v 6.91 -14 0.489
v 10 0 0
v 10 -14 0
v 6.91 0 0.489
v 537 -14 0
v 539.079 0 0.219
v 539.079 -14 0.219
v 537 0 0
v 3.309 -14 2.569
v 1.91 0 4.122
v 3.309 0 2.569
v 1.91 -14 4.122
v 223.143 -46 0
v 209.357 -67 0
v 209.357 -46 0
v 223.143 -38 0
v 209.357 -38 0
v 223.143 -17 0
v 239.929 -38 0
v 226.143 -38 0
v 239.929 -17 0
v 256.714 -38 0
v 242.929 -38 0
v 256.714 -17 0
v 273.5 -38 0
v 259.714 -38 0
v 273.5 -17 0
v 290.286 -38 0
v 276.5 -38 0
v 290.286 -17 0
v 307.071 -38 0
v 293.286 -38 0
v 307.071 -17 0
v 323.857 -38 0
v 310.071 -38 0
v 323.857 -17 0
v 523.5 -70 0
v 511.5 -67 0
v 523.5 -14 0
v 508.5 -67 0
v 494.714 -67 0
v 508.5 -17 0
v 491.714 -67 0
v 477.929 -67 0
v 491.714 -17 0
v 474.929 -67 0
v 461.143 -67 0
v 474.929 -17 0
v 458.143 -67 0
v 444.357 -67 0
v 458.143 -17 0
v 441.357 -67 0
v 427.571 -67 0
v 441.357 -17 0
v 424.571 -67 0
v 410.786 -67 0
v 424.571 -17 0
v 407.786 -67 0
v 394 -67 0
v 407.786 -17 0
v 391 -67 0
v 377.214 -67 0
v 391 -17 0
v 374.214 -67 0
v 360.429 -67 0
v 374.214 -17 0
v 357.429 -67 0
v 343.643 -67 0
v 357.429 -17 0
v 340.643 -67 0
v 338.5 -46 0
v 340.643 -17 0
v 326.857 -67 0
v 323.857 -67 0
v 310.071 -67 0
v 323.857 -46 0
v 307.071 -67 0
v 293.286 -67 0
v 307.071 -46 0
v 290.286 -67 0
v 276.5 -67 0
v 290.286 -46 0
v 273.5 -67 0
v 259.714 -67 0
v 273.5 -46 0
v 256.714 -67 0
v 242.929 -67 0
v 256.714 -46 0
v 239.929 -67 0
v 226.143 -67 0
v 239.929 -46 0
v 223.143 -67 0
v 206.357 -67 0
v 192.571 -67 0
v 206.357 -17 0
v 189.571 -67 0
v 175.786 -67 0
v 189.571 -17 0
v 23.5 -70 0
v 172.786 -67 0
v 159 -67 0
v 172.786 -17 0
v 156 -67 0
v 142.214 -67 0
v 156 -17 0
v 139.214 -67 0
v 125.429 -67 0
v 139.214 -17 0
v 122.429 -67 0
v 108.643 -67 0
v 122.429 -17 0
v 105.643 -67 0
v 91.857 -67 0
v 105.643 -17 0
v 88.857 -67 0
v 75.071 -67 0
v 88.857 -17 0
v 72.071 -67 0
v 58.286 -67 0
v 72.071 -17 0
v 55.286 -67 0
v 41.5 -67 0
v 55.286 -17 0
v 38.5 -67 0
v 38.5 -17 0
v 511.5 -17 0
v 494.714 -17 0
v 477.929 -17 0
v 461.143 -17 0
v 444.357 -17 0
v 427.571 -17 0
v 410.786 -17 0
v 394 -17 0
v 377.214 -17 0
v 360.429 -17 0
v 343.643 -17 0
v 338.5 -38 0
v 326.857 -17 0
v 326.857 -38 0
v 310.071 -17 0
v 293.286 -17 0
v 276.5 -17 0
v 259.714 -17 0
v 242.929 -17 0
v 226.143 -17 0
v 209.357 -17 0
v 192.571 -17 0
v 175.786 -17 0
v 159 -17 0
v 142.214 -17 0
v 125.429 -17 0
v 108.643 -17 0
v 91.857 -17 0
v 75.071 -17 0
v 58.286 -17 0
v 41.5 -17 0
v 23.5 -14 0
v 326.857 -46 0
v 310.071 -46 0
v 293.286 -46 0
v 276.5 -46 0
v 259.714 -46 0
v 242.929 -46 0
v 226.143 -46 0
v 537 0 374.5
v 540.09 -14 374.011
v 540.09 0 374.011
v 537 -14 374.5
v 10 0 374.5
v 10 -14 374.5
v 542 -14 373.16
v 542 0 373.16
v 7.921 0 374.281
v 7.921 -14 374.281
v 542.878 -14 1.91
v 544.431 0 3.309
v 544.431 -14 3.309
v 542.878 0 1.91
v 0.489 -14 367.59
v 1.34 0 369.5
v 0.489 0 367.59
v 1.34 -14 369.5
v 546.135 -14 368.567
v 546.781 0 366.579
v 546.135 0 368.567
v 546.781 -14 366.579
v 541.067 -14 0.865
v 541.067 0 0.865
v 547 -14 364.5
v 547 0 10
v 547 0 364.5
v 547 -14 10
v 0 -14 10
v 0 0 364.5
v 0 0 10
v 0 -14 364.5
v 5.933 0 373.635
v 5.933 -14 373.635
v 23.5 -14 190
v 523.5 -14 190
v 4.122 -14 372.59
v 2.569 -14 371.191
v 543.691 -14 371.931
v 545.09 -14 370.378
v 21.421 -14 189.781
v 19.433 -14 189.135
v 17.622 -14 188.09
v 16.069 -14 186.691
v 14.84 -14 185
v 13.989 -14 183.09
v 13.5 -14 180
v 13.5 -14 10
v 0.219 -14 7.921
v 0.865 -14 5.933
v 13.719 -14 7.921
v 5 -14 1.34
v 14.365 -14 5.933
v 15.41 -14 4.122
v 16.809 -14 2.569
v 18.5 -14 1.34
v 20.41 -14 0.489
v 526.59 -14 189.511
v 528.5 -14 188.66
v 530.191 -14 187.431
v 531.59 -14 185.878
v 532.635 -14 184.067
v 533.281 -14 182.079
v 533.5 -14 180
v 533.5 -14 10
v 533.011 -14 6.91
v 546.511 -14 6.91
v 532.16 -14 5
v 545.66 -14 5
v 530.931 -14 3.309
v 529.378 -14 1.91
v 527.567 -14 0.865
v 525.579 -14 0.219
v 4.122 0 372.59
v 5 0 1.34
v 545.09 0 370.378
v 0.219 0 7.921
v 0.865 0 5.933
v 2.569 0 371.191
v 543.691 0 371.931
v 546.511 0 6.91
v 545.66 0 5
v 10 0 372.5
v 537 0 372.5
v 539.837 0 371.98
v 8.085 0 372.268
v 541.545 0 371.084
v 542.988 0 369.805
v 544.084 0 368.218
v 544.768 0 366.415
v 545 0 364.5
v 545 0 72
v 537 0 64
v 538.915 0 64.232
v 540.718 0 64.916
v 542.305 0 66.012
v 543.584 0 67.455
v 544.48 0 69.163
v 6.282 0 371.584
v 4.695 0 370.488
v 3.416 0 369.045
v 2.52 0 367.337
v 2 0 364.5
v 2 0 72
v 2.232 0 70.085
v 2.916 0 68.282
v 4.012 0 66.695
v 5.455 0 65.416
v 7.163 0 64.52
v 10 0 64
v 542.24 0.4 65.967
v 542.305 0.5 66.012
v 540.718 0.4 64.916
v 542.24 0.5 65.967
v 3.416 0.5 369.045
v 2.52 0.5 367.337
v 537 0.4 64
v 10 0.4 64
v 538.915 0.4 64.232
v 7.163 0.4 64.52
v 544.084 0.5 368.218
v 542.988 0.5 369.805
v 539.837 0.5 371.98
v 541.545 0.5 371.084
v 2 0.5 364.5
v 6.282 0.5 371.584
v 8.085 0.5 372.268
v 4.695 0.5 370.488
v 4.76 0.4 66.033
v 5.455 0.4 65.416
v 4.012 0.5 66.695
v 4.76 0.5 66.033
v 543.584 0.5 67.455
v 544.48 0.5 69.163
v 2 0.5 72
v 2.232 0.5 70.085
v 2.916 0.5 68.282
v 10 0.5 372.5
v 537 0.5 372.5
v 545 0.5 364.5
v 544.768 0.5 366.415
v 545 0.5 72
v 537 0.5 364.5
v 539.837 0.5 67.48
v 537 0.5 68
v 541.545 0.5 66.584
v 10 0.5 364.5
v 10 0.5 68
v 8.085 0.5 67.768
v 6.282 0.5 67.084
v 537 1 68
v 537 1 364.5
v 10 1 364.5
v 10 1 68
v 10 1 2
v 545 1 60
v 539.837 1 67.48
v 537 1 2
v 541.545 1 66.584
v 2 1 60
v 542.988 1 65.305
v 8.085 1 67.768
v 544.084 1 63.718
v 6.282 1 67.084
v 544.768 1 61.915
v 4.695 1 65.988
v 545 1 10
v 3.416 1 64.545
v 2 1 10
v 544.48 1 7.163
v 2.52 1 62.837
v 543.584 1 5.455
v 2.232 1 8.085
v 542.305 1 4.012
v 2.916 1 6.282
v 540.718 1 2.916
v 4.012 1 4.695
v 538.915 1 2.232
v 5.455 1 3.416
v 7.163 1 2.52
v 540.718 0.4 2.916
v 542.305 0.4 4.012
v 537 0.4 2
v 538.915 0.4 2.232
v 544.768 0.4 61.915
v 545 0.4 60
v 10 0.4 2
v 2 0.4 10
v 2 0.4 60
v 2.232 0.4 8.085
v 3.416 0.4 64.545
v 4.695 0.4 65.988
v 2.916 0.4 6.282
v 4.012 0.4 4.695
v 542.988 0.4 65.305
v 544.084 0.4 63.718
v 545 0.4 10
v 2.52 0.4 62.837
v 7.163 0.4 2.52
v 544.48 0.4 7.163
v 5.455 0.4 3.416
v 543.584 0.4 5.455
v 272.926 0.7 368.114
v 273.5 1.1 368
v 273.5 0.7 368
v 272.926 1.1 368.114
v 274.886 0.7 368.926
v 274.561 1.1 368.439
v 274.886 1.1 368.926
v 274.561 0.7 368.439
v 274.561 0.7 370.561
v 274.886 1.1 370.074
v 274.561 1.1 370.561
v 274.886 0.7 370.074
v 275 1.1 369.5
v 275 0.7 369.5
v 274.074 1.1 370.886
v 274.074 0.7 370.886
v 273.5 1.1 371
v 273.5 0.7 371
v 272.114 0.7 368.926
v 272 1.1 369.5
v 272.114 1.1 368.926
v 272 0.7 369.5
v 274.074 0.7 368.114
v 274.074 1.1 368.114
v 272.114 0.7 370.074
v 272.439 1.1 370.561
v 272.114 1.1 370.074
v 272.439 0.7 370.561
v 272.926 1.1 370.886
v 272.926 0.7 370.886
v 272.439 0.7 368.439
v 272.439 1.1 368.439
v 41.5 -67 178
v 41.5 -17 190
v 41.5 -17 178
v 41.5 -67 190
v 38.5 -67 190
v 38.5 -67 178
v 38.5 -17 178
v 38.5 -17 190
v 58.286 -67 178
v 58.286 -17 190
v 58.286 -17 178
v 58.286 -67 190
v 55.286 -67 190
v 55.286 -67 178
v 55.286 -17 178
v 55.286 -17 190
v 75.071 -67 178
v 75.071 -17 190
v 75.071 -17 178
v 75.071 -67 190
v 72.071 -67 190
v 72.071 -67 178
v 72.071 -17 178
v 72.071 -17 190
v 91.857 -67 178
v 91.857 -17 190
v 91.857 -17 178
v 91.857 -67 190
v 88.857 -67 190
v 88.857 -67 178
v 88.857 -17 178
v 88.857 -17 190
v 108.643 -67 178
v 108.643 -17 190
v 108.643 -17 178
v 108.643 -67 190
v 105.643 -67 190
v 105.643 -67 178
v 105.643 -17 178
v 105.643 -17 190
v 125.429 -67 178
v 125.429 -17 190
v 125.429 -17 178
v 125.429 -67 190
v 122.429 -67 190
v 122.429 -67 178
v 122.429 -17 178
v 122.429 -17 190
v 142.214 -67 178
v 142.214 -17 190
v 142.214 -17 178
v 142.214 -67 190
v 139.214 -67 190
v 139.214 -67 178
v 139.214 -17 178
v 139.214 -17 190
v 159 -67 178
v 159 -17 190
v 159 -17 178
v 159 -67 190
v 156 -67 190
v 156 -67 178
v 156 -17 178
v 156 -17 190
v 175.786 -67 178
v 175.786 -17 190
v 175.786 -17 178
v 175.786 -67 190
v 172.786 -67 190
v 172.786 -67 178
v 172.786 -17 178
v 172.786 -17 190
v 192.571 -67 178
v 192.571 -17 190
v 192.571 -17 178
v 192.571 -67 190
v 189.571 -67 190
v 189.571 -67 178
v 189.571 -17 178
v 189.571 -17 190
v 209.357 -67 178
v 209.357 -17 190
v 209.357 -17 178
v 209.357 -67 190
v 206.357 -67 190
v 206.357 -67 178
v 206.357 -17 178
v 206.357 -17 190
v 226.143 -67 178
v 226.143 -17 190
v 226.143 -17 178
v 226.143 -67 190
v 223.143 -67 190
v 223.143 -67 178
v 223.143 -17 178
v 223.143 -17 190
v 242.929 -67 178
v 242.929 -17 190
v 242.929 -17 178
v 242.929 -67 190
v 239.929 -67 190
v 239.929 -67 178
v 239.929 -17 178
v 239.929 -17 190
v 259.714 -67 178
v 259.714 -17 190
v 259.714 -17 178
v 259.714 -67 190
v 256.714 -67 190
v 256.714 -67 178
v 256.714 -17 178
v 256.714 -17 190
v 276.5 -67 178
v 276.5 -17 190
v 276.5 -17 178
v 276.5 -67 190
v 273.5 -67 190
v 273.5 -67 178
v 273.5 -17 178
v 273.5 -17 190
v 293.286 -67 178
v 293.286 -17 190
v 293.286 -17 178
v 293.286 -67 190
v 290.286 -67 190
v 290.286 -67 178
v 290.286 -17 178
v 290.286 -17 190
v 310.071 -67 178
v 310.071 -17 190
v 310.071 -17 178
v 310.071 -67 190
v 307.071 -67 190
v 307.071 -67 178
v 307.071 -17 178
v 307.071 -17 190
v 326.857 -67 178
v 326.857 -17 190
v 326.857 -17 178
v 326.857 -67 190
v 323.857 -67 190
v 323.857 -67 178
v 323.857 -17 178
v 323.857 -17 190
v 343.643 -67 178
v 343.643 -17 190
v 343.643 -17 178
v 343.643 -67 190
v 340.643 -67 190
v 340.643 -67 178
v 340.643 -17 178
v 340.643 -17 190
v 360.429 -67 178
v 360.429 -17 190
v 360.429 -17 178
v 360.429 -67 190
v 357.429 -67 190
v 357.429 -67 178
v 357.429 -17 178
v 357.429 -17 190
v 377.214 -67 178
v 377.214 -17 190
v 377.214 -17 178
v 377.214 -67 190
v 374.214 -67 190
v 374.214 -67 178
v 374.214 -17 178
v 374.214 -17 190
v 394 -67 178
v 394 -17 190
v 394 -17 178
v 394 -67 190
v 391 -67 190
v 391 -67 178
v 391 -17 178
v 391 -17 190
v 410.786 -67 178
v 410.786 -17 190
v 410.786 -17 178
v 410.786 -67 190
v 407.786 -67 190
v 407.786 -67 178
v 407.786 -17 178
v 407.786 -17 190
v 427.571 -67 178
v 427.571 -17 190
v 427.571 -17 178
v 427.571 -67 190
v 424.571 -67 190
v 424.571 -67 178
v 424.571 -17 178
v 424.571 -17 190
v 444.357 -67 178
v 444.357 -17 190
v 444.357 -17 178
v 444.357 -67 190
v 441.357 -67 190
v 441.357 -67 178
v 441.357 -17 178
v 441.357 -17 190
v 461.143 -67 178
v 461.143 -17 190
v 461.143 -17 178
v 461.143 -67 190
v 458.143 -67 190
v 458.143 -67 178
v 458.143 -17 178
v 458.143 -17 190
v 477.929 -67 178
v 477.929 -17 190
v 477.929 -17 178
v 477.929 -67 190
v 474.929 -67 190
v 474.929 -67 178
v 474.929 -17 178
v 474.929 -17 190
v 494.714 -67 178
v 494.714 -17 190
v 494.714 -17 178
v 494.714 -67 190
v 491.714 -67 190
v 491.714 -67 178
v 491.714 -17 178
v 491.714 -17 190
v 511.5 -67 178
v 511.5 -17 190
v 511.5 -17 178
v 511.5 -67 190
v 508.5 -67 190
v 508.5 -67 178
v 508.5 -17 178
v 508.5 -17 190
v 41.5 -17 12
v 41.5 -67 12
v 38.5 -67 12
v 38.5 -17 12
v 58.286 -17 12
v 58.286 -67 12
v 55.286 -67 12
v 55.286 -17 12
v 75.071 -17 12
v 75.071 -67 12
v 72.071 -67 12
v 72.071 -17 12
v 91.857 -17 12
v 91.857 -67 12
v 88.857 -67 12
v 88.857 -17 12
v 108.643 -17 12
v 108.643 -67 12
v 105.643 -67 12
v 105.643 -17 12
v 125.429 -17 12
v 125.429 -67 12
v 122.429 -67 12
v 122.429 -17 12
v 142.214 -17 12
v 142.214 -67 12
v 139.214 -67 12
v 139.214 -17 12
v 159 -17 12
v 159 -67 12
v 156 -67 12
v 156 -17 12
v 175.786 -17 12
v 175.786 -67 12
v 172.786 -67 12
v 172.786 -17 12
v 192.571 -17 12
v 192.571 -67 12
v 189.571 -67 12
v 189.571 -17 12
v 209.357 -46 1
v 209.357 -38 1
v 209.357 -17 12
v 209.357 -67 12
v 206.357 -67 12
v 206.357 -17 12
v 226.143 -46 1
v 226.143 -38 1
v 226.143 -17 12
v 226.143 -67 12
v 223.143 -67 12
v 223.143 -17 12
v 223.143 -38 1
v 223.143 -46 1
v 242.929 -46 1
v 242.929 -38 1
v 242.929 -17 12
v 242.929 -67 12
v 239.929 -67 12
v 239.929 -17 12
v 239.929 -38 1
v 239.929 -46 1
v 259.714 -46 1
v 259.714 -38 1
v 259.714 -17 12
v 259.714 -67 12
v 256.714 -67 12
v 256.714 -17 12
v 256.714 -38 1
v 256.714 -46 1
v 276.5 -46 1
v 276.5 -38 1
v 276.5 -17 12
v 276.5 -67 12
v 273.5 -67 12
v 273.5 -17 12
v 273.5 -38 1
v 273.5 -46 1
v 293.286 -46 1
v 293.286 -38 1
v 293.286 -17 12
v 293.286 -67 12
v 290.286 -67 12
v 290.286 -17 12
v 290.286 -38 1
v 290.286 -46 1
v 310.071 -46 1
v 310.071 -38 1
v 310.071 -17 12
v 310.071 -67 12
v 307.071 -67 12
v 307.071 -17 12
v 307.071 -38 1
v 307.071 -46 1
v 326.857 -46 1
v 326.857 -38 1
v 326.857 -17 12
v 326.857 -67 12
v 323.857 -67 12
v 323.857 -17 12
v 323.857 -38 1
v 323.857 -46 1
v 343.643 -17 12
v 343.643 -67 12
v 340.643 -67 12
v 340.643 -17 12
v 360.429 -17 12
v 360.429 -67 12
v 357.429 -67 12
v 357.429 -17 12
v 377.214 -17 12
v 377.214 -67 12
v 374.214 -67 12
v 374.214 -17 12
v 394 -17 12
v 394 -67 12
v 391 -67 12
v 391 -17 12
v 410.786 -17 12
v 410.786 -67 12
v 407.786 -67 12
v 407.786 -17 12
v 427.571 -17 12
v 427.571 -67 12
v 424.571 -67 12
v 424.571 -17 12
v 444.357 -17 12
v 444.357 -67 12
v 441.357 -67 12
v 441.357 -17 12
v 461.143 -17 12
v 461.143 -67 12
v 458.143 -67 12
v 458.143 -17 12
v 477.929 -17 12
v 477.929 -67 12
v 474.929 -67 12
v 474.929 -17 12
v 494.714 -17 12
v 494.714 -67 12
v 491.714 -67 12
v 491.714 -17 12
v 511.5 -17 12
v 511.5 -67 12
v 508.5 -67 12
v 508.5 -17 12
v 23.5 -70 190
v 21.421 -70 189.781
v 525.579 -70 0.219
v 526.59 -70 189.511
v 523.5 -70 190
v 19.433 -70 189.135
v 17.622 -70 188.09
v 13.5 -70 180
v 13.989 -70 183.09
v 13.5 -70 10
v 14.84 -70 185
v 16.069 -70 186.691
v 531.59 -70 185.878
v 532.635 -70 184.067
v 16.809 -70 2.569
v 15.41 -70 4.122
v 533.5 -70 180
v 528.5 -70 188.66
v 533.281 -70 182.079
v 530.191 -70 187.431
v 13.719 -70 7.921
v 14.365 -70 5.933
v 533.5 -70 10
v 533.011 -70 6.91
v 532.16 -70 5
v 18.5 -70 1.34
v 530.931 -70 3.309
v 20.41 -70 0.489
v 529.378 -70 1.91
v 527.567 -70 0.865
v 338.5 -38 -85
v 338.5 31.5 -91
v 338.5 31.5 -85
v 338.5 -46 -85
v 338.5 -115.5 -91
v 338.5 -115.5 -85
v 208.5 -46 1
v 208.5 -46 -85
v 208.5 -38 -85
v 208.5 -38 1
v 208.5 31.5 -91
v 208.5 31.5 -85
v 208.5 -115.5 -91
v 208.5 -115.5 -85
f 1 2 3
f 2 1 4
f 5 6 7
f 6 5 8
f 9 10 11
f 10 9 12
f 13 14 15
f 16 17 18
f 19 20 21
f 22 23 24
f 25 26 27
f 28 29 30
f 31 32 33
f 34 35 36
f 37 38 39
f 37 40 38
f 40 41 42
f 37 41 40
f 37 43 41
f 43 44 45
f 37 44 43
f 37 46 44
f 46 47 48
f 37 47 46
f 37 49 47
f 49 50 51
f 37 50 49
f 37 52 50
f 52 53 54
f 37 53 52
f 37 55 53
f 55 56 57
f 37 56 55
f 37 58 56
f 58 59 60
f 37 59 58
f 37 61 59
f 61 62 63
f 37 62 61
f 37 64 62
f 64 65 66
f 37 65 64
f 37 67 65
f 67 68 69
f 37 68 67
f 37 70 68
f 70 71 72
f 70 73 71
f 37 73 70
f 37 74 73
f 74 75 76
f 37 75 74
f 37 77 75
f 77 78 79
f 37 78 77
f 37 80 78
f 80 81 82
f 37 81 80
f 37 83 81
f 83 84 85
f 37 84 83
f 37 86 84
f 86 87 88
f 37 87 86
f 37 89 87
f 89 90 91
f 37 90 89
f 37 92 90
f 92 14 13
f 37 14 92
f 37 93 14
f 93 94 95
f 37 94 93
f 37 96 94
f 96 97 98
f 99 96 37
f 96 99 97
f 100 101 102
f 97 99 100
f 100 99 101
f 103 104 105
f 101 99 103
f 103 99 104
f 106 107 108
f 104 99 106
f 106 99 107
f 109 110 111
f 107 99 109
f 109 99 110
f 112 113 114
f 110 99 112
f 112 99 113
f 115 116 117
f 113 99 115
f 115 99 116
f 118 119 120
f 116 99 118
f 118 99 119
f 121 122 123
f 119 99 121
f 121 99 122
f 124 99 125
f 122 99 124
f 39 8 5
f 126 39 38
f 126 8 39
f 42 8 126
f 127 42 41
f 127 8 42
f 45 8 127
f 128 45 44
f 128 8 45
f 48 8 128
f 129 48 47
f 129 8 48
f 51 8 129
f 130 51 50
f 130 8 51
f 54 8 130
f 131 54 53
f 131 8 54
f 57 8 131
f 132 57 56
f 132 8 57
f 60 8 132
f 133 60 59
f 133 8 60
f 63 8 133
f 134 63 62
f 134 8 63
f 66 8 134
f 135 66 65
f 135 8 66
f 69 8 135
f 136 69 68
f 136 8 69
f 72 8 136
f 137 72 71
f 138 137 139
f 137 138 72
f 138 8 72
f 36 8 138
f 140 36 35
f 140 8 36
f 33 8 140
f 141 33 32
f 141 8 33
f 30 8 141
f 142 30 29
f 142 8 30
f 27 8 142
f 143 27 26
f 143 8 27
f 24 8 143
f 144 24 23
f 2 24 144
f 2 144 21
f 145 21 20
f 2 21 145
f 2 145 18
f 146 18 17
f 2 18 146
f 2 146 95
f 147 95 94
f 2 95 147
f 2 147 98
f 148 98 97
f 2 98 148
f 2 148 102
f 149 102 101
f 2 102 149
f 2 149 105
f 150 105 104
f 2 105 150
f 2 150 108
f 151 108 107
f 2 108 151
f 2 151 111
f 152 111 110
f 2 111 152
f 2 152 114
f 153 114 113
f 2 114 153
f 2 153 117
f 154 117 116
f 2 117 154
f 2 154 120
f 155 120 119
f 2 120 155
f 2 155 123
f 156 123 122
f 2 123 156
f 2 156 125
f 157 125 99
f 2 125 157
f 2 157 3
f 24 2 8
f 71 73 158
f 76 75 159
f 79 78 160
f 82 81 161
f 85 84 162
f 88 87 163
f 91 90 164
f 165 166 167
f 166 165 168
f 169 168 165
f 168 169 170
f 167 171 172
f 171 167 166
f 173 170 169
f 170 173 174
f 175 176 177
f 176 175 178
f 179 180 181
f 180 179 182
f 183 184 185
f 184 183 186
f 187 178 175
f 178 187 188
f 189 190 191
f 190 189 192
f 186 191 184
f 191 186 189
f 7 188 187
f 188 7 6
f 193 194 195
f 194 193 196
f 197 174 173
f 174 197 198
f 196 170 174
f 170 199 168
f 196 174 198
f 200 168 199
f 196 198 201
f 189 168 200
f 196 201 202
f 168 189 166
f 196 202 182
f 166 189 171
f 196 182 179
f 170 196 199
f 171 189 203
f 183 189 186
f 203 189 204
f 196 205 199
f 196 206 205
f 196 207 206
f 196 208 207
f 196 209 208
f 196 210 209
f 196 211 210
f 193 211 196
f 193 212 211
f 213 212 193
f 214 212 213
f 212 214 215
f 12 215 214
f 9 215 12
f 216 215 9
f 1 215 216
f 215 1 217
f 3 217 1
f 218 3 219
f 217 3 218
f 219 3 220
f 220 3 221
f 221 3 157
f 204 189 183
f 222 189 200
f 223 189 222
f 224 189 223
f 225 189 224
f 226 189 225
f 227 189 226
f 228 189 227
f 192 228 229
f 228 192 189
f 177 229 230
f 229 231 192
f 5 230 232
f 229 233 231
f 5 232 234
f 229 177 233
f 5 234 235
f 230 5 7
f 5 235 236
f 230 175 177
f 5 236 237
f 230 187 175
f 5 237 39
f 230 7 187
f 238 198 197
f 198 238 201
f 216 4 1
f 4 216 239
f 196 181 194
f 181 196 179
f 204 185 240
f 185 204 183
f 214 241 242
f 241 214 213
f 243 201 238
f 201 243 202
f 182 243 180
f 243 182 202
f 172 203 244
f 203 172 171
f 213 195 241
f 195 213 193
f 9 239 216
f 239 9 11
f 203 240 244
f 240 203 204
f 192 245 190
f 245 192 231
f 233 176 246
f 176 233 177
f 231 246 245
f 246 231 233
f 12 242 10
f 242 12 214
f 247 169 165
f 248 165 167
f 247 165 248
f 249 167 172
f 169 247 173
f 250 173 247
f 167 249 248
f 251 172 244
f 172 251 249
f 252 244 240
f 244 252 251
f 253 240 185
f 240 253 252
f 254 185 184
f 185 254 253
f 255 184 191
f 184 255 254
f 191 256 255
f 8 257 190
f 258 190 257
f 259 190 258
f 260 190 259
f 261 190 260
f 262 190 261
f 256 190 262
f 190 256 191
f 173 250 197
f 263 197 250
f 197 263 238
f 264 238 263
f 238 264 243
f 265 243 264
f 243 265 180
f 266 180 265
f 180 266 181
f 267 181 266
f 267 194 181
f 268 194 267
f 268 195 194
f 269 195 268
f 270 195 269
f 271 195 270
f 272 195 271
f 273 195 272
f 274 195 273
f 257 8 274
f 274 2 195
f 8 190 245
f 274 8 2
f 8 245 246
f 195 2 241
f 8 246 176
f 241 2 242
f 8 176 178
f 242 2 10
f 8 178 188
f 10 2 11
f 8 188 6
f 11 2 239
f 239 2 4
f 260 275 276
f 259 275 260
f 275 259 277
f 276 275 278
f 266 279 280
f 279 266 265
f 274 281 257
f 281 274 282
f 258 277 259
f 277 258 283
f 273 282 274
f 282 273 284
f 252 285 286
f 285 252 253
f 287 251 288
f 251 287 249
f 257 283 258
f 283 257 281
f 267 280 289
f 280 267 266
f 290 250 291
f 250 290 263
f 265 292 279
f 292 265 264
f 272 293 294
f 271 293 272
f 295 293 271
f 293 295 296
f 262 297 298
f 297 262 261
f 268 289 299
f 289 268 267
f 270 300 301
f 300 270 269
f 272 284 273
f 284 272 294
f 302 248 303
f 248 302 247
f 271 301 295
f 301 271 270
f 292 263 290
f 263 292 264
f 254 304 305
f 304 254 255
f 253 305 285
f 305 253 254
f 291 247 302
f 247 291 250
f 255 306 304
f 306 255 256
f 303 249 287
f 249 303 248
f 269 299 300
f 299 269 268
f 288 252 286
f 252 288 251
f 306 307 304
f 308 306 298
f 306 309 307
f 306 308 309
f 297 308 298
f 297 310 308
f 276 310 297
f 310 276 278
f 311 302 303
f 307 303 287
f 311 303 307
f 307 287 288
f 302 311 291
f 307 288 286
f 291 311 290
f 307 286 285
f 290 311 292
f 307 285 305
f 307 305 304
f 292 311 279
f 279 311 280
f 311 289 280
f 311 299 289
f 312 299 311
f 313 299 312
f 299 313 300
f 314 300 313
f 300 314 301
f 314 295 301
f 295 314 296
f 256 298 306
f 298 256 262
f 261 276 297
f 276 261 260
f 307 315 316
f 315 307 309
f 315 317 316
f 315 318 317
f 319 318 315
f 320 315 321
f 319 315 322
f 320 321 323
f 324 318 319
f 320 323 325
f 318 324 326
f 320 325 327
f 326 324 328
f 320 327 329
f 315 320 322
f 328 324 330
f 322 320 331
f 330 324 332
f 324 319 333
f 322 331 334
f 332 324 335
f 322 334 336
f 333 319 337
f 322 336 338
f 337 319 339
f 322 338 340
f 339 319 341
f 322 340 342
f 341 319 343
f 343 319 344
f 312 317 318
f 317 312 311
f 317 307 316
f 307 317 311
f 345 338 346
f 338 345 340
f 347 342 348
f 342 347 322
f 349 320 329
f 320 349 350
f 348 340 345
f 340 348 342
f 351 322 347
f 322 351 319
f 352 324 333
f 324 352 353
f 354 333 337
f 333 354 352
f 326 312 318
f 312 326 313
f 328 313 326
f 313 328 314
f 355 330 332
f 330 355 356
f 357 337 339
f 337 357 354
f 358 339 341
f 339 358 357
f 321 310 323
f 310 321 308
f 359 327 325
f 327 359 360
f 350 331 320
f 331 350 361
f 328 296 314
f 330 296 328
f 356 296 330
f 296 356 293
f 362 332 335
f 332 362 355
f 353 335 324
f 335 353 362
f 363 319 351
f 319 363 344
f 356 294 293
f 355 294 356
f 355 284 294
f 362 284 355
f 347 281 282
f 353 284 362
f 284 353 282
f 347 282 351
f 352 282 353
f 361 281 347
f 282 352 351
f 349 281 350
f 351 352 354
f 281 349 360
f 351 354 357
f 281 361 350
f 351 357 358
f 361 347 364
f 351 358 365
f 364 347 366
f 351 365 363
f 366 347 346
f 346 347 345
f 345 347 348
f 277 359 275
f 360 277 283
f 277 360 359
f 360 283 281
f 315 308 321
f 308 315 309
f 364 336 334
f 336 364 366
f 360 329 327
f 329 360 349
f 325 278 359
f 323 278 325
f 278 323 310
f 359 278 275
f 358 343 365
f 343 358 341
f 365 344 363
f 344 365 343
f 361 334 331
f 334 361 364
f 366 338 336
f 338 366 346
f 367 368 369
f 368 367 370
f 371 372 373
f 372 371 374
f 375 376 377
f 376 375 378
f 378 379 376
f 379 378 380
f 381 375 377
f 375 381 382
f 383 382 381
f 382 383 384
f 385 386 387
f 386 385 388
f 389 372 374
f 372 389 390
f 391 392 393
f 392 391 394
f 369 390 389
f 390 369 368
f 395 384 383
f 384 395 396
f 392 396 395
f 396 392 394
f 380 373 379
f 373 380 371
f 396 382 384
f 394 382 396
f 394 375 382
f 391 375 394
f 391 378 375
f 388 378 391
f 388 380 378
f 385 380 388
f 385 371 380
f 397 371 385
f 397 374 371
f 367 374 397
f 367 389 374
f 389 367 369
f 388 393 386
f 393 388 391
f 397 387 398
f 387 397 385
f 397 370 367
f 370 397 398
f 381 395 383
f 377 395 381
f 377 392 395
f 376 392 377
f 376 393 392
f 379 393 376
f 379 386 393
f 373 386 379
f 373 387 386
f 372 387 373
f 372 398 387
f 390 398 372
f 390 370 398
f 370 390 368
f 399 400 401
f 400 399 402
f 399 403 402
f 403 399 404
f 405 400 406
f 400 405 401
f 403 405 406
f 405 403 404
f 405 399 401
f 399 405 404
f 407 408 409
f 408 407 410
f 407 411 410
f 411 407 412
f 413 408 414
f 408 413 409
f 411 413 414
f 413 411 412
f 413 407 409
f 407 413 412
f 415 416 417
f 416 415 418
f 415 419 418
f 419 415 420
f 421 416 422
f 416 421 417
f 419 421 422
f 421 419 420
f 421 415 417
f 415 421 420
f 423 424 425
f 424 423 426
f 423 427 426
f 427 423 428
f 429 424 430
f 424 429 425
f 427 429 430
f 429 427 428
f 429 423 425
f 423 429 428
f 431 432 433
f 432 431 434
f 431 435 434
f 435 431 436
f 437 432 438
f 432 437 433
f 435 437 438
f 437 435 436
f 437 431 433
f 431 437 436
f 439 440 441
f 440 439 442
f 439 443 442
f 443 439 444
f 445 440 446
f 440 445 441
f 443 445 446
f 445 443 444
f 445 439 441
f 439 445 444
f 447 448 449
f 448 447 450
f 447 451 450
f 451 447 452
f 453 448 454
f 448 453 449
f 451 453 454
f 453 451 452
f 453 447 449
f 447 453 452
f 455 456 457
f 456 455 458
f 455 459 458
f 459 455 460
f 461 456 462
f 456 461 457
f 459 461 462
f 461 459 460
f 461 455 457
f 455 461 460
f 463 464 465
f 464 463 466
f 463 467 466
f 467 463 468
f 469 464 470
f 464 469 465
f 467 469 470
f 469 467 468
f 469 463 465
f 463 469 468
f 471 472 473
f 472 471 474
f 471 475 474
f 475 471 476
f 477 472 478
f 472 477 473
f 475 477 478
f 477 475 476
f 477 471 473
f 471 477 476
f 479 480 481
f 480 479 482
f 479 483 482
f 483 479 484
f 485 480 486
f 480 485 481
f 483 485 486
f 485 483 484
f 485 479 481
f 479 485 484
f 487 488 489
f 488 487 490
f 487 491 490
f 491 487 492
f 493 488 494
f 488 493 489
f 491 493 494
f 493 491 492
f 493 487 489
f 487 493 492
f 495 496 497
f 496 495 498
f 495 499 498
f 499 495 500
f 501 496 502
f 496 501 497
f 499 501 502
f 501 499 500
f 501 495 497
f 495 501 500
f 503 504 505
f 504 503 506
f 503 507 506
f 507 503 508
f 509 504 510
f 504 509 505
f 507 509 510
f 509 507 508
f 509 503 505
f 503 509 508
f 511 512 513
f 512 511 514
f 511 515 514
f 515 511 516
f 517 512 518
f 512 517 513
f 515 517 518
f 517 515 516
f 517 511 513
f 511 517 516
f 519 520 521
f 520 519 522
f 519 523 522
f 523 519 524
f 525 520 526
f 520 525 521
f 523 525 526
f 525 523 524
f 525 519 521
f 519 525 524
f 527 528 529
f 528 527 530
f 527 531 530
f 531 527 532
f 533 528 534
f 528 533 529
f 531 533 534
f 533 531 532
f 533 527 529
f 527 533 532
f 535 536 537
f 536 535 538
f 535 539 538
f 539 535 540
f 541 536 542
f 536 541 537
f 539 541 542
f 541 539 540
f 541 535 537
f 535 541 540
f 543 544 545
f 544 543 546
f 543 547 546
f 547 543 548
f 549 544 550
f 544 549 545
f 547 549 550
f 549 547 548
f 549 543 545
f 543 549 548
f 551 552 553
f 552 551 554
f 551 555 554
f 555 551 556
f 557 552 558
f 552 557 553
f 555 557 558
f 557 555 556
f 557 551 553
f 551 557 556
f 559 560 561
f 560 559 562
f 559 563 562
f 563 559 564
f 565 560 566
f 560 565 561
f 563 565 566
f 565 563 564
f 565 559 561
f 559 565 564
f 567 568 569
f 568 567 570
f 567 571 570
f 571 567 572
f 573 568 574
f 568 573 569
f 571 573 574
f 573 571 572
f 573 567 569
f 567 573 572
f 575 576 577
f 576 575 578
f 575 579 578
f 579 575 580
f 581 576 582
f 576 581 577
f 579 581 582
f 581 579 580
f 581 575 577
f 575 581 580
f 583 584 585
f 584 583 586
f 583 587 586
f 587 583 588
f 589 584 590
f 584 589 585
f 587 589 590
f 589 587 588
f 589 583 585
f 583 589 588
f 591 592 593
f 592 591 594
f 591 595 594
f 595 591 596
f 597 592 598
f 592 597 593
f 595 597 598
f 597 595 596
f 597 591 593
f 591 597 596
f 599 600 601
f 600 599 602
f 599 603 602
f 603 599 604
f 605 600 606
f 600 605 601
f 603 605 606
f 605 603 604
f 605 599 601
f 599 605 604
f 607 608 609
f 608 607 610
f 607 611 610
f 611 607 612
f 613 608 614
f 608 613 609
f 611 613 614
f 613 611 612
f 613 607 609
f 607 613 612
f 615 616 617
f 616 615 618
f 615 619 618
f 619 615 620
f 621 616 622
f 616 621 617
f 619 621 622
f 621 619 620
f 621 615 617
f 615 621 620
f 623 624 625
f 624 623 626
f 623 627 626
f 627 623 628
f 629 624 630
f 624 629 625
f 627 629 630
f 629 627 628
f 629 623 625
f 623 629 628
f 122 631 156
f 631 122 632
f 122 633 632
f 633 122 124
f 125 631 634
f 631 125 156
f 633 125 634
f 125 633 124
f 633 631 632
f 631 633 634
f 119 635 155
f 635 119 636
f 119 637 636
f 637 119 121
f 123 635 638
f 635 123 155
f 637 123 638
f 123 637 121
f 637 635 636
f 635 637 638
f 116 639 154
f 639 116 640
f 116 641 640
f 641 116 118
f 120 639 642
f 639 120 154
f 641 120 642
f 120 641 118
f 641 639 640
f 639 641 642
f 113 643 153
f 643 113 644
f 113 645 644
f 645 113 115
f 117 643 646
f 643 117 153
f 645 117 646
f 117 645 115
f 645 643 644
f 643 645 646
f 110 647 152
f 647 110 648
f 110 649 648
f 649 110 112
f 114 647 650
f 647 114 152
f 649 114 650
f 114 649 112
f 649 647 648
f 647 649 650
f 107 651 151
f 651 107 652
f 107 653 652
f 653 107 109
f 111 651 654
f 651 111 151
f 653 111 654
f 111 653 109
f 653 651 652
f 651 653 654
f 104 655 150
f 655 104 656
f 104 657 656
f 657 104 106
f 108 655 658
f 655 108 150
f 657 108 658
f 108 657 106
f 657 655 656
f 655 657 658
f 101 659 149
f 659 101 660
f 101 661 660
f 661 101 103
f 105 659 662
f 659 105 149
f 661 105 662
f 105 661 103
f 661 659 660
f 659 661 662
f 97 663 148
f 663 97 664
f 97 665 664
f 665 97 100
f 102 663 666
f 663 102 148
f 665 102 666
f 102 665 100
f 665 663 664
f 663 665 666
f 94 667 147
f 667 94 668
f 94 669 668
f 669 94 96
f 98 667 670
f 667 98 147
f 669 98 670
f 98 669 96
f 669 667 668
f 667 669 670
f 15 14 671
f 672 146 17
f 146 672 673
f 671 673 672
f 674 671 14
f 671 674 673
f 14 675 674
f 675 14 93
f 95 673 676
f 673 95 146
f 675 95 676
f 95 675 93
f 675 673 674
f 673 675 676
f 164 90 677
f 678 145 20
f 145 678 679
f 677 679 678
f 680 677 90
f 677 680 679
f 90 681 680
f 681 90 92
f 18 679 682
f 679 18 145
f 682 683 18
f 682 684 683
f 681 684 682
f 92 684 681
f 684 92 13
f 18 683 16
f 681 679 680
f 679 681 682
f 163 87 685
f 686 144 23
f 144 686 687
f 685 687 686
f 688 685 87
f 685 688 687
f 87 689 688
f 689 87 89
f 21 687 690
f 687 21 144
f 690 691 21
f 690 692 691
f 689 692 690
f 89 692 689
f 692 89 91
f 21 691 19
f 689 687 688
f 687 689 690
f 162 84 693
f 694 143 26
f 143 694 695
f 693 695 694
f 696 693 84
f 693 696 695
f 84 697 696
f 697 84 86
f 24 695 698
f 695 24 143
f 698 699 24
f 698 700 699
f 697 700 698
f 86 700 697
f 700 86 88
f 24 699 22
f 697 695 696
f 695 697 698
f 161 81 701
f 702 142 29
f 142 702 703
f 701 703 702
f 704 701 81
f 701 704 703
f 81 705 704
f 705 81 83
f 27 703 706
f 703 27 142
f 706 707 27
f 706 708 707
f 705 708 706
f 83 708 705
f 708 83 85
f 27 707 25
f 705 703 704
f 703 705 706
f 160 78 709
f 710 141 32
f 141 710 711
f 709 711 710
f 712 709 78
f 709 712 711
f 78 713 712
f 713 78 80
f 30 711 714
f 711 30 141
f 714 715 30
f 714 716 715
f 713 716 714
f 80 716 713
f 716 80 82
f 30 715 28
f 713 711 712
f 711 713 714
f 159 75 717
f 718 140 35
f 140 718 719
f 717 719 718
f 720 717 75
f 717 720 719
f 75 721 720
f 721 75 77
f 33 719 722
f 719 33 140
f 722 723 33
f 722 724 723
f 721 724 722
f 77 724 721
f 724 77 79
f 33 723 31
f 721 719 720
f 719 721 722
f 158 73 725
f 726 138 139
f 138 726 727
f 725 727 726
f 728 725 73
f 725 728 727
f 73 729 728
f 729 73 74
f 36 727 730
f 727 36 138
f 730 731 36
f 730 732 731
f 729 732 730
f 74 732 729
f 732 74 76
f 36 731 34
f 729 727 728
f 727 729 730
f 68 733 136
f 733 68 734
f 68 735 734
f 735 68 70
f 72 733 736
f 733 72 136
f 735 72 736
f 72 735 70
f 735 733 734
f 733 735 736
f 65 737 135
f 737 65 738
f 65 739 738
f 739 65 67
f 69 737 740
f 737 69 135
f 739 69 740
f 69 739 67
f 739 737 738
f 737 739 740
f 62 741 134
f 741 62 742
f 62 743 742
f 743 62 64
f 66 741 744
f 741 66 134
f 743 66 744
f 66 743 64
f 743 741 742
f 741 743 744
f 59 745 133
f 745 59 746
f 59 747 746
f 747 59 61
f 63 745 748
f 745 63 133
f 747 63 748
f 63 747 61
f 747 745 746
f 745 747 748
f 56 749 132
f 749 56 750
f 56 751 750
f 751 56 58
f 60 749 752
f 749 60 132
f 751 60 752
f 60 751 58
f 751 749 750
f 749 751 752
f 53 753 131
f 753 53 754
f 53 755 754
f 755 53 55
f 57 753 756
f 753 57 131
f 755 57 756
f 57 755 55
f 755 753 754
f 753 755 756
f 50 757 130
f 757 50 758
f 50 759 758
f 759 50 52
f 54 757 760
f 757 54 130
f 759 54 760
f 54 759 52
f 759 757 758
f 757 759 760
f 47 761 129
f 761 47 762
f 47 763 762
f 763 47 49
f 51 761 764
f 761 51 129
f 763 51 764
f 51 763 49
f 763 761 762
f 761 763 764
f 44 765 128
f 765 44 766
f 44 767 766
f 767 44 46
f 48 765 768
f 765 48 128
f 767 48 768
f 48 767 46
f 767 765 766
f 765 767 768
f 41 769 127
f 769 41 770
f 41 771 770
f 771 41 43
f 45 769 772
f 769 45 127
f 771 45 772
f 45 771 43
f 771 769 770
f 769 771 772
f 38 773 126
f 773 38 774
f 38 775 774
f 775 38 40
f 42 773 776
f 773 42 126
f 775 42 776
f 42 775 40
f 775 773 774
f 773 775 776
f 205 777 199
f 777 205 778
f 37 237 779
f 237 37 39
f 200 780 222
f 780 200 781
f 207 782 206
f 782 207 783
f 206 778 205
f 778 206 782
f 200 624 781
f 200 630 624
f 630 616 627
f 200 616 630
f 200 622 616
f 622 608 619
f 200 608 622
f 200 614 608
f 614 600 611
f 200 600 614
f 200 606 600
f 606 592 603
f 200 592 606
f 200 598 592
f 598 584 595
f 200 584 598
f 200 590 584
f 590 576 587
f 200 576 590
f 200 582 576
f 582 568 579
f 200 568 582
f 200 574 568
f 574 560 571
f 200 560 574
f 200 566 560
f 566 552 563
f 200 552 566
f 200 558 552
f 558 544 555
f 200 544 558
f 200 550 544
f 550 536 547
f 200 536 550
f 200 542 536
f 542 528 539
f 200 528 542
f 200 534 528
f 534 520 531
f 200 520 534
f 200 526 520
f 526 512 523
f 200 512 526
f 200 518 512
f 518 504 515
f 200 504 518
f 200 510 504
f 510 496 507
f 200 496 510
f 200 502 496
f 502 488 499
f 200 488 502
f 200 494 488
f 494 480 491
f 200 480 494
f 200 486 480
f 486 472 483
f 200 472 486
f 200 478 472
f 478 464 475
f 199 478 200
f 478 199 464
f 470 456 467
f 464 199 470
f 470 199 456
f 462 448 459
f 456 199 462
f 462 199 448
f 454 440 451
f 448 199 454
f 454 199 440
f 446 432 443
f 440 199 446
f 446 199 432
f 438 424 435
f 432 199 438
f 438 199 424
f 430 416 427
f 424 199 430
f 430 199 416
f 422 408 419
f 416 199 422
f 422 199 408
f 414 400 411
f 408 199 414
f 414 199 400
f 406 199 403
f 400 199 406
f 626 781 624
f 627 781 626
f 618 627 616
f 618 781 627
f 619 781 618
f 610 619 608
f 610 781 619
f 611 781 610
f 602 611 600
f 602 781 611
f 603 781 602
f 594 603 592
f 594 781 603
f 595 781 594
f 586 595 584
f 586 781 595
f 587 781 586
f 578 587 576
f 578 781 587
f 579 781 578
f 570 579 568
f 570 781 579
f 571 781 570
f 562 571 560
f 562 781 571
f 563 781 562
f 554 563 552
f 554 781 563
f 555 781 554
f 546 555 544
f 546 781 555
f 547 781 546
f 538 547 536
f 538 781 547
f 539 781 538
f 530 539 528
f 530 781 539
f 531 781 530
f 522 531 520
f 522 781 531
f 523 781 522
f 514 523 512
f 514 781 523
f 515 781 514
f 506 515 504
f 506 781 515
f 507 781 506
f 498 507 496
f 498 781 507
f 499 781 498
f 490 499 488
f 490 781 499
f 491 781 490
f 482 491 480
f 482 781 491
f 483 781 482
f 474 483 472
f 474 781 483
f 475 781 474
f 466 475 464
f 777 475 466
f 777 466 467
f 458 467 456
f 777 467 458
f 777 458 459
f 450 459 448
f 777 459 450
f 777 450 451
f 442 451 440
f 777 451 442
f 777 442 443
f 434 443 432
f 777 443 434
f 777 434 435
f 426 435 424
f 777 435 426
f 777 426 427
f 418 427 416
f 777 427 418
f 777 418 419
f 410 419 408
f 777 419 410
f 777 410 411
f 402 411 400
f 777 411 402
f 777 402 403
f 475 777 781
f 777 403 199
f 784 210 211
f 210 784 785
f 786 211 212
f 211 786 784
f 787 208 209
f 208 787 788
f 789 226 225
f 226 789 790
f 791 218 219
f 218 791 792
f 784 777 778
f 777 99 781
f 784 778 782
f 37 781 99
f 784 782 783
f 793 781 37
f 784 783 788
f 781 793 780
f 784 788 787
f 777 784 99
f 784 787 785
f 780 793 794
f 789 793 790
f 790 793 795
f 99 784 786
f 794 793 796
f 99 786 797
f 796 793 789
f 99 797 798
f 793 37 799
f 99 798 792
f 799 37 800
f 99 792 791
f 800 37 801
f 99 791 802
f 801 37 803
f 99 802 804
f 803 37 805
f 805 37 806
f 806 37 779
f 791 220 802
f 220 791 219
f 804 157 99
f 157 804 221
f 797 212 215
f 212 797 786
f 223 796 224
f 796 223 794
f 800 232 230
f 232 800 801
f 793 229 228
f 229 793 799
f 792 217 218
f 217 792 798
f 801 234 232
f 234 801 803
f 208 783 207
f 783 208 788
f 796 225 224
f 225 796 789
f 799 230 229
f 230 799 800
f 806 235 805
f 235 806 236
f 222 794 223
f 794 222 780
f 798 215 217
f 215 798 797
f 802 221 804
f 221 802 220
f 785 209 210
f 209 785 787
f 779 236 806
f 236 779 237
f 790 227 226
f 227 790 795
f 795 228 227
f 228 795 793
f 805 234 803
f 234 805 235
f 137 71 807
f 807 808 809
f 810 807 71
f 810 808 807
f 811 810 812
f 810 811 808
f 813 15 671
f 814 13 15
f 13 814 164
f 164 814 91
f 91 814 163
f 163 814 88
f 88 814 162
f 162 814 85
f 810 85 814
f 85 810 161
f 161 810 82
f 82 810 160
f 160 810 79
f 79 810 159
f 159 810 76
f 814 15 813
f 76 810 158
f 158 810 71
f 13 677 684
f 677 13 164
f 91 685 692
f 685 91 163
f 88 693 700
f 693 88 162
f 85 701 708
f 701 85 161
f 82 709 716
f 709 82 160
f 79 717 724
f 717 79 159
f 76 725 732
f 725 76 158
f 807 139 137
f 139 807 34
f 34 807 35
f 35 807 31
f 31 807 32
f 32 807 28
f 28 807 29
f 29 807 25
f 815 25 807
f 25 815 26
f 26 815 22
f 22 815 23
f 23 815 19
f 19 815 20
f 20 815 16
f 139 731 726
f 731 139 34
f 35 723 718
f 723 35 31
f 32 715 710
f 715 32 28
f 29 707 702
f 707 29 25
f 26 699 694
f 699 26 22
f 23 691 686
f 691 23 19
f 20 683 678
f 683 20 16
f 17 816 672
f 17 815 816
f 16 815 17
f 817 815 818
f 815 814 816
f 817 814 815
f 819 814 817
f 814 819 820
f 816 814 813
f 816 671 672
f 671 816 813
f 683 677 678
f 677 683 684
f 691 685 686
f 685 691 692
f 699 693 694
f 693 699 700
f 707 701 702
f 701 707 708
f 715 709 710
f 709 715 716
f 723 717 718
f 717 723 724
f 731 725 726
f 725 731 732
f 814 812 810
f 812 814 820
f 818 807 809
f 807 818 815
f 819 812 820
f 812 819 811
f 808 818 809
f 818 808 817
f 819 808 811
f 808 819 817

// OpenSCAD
// iMac(24インチ, M6, 2026) 風 一体型ゲーミングPC (v3)   単位: mm
// 寸法の根拠: Apple公式スペック(幅54.7cm/高さ46.1cm/スタンド奥行14.7cm/幅13cm)と公式画像の比率
// 座標: x=幅, y=高さ(本体下端=0), z=奥行(前面ガラス=0, 背面方向+)
// cutaway=true で背面カバーを外し内部配置を表示
cutaway = false;
color_scheme = "silver";   // silver / blue / pink / green

// --- 外形 (iMac 24") ---
W = 547;                    // 本体幅 (公式 54.7cm)
panel_w = 527; panel_h = 296.5;   // 23.8" 16:9 パネル有効領域 (iMacの表示領域は約520x292)
bezel = 10;  chin = 68;
H = panel_h + bezel + chin;       // ≈374.5
slab_t = 14;                // 前面スラブ厚 (iMacは11.5mm, 市販パネル+背面板で14mm)
corner = 10;
// --- 背面ポッド(市販部品を収める) ---
pod_w = 520; pod_h = 190; pod_t = 70;     // 総厚70mm
pod_x0 = (W-pod_w)/2;
// --- スタンド(iMac風一枚板アルミ) ---
stand_w = 130; stand_drop = 85;           // 公式: 本体下端から約85mm下がる(高さ46.1cm)
foot_d = 147;
cx = pod_x0;

palette = [
 ["silver", "#d9dbde", "#e6e7ea", "#b9bcc1"],
 ["blue",   "#7ea3d8", "#a9c2e6", "#5f86bd"],
 ["pink",   "#e48aa6", "#f0b2c4", "#c96a89"],
 ["green",  "#8cc59a", "#b2dbbb", "#6da97c"] ];
pal = palette[search([color_scheme],palette)[0]];
body_c = pal[1]; chin_c = pal[2]; stand_c = pal[3];

module rrect(w,h,t,r){ linear_extrude(t) offset(r) offset(-r) square([w,h]); }
module box(p,s,c){ color(c) translate(p) cube(s); }

module slab(){
  color(body_c) rrect(W,H,slab_t,corner);
  color("#f4f4f6") translate([2,H-bezel-panel_h-4,-0.5]) rrect(W-4,panel_h+bezel+4-2,0.6,corner-2); // 前面ガラス(白縁)
  color("#0a0a0c") translate([(W-panel_w)/2,chin,-1]) cube([panel_w,panel_h,0.6]);                     // 表示領域
  color(chin_c)  translate([2,2,-1]) rrect(W-4,chin-2,0.6,corner-2);                                   // チン(淡色)
  color("#333") translate([W/2,H-5,-1.1]) cylinder(d=3,h=0.4,$fn=16);                                  // カメラ
}

module pod_cover(){
  difference(){
    color(body_c) translate([pod_x0,0,slab_t]) rrect(pod_w,pod_h,pod_t-slab_t,10);
    for(i=[0:28]) translate([pod_x0+25+i*(pod_w-50)/28, pod_h-12, slab_t+3]) cube([3,14,pod_t-slab_t-6]);  // 排気
    for(i=[0:28]) translate([pod_x0+25+i*(pod_w-50)/28, -2, slab_t+3]) cube([3,14,pod_t-slab_t-6]);        // 吸気
    if(cutaway) translate([pod_x0+3,3,slab_t+2.5]) cube([pod_w-6,pod_h-6,pod_t]);
  }
  // 背面I/O: iMac風の細スロットを左下に4つ
  if(!cutaway) for(i=[0:3]) color("#222") translate([pod_x0+30+i*14,18,pod_t-0.3]) rrect(4,12,0.4,2);
}

z0 = slab_t + 3;
module internals(){
  x = pod_x0;
  box([x+8,8,z0],[170,170,1.6],"#2a6a3a");                           // Mini-ITX 170x170
  box([x+60,60,z0+1.6],[66,66,35],"#b0b3b8");                         // 低背CPUクーラー
  color("#222") translate([x+93,93,z0+36.6]) cylinder(d=92,h=2,$fn=48);
  box([x+16,18,z0+1.6],[22,10,4],"#333");                             // M.2 SSD
  box([x+178,30,z0],[8,100,12],"#554");                               // PCIe ライザー
  box([x+188,20,z0],[200,125,40],"#202226");                          // GPU (ITX 2スロット)
  color("#888") translate([x+288,82,z0+40.1]) cylinder(d=70,h=0.5,$fn=40);
  box([x+188,148,z0],[150,34,22],"#334");                             // DC-ATX 電源基板
  box([x+396,35,z0],[120,120,25],"#111");                             // 排気ファン 120mm
  color("#555") translate([x+456,95,z0+25.1]) cylinder(d=100,h=0.5,$fn=48);
}

module stand(){
  color(stand_c) translate([W/2-stand_w/2,-stand_drop,(slab_t+pod_t)/2-4]) cube([stand_w,stand_drop+1,8]);        // アーム
  color(stand_c) translate([W/2-stand_w/2,-stand_drop-6,(slab_t+pod_t)/2-foot_d/2]) cube([stand_w,6,foot_d]);     // 足
}

rotate([90,0,0]) { slab(); pod_cover(); stand(); if(cutaway) internals(); }
